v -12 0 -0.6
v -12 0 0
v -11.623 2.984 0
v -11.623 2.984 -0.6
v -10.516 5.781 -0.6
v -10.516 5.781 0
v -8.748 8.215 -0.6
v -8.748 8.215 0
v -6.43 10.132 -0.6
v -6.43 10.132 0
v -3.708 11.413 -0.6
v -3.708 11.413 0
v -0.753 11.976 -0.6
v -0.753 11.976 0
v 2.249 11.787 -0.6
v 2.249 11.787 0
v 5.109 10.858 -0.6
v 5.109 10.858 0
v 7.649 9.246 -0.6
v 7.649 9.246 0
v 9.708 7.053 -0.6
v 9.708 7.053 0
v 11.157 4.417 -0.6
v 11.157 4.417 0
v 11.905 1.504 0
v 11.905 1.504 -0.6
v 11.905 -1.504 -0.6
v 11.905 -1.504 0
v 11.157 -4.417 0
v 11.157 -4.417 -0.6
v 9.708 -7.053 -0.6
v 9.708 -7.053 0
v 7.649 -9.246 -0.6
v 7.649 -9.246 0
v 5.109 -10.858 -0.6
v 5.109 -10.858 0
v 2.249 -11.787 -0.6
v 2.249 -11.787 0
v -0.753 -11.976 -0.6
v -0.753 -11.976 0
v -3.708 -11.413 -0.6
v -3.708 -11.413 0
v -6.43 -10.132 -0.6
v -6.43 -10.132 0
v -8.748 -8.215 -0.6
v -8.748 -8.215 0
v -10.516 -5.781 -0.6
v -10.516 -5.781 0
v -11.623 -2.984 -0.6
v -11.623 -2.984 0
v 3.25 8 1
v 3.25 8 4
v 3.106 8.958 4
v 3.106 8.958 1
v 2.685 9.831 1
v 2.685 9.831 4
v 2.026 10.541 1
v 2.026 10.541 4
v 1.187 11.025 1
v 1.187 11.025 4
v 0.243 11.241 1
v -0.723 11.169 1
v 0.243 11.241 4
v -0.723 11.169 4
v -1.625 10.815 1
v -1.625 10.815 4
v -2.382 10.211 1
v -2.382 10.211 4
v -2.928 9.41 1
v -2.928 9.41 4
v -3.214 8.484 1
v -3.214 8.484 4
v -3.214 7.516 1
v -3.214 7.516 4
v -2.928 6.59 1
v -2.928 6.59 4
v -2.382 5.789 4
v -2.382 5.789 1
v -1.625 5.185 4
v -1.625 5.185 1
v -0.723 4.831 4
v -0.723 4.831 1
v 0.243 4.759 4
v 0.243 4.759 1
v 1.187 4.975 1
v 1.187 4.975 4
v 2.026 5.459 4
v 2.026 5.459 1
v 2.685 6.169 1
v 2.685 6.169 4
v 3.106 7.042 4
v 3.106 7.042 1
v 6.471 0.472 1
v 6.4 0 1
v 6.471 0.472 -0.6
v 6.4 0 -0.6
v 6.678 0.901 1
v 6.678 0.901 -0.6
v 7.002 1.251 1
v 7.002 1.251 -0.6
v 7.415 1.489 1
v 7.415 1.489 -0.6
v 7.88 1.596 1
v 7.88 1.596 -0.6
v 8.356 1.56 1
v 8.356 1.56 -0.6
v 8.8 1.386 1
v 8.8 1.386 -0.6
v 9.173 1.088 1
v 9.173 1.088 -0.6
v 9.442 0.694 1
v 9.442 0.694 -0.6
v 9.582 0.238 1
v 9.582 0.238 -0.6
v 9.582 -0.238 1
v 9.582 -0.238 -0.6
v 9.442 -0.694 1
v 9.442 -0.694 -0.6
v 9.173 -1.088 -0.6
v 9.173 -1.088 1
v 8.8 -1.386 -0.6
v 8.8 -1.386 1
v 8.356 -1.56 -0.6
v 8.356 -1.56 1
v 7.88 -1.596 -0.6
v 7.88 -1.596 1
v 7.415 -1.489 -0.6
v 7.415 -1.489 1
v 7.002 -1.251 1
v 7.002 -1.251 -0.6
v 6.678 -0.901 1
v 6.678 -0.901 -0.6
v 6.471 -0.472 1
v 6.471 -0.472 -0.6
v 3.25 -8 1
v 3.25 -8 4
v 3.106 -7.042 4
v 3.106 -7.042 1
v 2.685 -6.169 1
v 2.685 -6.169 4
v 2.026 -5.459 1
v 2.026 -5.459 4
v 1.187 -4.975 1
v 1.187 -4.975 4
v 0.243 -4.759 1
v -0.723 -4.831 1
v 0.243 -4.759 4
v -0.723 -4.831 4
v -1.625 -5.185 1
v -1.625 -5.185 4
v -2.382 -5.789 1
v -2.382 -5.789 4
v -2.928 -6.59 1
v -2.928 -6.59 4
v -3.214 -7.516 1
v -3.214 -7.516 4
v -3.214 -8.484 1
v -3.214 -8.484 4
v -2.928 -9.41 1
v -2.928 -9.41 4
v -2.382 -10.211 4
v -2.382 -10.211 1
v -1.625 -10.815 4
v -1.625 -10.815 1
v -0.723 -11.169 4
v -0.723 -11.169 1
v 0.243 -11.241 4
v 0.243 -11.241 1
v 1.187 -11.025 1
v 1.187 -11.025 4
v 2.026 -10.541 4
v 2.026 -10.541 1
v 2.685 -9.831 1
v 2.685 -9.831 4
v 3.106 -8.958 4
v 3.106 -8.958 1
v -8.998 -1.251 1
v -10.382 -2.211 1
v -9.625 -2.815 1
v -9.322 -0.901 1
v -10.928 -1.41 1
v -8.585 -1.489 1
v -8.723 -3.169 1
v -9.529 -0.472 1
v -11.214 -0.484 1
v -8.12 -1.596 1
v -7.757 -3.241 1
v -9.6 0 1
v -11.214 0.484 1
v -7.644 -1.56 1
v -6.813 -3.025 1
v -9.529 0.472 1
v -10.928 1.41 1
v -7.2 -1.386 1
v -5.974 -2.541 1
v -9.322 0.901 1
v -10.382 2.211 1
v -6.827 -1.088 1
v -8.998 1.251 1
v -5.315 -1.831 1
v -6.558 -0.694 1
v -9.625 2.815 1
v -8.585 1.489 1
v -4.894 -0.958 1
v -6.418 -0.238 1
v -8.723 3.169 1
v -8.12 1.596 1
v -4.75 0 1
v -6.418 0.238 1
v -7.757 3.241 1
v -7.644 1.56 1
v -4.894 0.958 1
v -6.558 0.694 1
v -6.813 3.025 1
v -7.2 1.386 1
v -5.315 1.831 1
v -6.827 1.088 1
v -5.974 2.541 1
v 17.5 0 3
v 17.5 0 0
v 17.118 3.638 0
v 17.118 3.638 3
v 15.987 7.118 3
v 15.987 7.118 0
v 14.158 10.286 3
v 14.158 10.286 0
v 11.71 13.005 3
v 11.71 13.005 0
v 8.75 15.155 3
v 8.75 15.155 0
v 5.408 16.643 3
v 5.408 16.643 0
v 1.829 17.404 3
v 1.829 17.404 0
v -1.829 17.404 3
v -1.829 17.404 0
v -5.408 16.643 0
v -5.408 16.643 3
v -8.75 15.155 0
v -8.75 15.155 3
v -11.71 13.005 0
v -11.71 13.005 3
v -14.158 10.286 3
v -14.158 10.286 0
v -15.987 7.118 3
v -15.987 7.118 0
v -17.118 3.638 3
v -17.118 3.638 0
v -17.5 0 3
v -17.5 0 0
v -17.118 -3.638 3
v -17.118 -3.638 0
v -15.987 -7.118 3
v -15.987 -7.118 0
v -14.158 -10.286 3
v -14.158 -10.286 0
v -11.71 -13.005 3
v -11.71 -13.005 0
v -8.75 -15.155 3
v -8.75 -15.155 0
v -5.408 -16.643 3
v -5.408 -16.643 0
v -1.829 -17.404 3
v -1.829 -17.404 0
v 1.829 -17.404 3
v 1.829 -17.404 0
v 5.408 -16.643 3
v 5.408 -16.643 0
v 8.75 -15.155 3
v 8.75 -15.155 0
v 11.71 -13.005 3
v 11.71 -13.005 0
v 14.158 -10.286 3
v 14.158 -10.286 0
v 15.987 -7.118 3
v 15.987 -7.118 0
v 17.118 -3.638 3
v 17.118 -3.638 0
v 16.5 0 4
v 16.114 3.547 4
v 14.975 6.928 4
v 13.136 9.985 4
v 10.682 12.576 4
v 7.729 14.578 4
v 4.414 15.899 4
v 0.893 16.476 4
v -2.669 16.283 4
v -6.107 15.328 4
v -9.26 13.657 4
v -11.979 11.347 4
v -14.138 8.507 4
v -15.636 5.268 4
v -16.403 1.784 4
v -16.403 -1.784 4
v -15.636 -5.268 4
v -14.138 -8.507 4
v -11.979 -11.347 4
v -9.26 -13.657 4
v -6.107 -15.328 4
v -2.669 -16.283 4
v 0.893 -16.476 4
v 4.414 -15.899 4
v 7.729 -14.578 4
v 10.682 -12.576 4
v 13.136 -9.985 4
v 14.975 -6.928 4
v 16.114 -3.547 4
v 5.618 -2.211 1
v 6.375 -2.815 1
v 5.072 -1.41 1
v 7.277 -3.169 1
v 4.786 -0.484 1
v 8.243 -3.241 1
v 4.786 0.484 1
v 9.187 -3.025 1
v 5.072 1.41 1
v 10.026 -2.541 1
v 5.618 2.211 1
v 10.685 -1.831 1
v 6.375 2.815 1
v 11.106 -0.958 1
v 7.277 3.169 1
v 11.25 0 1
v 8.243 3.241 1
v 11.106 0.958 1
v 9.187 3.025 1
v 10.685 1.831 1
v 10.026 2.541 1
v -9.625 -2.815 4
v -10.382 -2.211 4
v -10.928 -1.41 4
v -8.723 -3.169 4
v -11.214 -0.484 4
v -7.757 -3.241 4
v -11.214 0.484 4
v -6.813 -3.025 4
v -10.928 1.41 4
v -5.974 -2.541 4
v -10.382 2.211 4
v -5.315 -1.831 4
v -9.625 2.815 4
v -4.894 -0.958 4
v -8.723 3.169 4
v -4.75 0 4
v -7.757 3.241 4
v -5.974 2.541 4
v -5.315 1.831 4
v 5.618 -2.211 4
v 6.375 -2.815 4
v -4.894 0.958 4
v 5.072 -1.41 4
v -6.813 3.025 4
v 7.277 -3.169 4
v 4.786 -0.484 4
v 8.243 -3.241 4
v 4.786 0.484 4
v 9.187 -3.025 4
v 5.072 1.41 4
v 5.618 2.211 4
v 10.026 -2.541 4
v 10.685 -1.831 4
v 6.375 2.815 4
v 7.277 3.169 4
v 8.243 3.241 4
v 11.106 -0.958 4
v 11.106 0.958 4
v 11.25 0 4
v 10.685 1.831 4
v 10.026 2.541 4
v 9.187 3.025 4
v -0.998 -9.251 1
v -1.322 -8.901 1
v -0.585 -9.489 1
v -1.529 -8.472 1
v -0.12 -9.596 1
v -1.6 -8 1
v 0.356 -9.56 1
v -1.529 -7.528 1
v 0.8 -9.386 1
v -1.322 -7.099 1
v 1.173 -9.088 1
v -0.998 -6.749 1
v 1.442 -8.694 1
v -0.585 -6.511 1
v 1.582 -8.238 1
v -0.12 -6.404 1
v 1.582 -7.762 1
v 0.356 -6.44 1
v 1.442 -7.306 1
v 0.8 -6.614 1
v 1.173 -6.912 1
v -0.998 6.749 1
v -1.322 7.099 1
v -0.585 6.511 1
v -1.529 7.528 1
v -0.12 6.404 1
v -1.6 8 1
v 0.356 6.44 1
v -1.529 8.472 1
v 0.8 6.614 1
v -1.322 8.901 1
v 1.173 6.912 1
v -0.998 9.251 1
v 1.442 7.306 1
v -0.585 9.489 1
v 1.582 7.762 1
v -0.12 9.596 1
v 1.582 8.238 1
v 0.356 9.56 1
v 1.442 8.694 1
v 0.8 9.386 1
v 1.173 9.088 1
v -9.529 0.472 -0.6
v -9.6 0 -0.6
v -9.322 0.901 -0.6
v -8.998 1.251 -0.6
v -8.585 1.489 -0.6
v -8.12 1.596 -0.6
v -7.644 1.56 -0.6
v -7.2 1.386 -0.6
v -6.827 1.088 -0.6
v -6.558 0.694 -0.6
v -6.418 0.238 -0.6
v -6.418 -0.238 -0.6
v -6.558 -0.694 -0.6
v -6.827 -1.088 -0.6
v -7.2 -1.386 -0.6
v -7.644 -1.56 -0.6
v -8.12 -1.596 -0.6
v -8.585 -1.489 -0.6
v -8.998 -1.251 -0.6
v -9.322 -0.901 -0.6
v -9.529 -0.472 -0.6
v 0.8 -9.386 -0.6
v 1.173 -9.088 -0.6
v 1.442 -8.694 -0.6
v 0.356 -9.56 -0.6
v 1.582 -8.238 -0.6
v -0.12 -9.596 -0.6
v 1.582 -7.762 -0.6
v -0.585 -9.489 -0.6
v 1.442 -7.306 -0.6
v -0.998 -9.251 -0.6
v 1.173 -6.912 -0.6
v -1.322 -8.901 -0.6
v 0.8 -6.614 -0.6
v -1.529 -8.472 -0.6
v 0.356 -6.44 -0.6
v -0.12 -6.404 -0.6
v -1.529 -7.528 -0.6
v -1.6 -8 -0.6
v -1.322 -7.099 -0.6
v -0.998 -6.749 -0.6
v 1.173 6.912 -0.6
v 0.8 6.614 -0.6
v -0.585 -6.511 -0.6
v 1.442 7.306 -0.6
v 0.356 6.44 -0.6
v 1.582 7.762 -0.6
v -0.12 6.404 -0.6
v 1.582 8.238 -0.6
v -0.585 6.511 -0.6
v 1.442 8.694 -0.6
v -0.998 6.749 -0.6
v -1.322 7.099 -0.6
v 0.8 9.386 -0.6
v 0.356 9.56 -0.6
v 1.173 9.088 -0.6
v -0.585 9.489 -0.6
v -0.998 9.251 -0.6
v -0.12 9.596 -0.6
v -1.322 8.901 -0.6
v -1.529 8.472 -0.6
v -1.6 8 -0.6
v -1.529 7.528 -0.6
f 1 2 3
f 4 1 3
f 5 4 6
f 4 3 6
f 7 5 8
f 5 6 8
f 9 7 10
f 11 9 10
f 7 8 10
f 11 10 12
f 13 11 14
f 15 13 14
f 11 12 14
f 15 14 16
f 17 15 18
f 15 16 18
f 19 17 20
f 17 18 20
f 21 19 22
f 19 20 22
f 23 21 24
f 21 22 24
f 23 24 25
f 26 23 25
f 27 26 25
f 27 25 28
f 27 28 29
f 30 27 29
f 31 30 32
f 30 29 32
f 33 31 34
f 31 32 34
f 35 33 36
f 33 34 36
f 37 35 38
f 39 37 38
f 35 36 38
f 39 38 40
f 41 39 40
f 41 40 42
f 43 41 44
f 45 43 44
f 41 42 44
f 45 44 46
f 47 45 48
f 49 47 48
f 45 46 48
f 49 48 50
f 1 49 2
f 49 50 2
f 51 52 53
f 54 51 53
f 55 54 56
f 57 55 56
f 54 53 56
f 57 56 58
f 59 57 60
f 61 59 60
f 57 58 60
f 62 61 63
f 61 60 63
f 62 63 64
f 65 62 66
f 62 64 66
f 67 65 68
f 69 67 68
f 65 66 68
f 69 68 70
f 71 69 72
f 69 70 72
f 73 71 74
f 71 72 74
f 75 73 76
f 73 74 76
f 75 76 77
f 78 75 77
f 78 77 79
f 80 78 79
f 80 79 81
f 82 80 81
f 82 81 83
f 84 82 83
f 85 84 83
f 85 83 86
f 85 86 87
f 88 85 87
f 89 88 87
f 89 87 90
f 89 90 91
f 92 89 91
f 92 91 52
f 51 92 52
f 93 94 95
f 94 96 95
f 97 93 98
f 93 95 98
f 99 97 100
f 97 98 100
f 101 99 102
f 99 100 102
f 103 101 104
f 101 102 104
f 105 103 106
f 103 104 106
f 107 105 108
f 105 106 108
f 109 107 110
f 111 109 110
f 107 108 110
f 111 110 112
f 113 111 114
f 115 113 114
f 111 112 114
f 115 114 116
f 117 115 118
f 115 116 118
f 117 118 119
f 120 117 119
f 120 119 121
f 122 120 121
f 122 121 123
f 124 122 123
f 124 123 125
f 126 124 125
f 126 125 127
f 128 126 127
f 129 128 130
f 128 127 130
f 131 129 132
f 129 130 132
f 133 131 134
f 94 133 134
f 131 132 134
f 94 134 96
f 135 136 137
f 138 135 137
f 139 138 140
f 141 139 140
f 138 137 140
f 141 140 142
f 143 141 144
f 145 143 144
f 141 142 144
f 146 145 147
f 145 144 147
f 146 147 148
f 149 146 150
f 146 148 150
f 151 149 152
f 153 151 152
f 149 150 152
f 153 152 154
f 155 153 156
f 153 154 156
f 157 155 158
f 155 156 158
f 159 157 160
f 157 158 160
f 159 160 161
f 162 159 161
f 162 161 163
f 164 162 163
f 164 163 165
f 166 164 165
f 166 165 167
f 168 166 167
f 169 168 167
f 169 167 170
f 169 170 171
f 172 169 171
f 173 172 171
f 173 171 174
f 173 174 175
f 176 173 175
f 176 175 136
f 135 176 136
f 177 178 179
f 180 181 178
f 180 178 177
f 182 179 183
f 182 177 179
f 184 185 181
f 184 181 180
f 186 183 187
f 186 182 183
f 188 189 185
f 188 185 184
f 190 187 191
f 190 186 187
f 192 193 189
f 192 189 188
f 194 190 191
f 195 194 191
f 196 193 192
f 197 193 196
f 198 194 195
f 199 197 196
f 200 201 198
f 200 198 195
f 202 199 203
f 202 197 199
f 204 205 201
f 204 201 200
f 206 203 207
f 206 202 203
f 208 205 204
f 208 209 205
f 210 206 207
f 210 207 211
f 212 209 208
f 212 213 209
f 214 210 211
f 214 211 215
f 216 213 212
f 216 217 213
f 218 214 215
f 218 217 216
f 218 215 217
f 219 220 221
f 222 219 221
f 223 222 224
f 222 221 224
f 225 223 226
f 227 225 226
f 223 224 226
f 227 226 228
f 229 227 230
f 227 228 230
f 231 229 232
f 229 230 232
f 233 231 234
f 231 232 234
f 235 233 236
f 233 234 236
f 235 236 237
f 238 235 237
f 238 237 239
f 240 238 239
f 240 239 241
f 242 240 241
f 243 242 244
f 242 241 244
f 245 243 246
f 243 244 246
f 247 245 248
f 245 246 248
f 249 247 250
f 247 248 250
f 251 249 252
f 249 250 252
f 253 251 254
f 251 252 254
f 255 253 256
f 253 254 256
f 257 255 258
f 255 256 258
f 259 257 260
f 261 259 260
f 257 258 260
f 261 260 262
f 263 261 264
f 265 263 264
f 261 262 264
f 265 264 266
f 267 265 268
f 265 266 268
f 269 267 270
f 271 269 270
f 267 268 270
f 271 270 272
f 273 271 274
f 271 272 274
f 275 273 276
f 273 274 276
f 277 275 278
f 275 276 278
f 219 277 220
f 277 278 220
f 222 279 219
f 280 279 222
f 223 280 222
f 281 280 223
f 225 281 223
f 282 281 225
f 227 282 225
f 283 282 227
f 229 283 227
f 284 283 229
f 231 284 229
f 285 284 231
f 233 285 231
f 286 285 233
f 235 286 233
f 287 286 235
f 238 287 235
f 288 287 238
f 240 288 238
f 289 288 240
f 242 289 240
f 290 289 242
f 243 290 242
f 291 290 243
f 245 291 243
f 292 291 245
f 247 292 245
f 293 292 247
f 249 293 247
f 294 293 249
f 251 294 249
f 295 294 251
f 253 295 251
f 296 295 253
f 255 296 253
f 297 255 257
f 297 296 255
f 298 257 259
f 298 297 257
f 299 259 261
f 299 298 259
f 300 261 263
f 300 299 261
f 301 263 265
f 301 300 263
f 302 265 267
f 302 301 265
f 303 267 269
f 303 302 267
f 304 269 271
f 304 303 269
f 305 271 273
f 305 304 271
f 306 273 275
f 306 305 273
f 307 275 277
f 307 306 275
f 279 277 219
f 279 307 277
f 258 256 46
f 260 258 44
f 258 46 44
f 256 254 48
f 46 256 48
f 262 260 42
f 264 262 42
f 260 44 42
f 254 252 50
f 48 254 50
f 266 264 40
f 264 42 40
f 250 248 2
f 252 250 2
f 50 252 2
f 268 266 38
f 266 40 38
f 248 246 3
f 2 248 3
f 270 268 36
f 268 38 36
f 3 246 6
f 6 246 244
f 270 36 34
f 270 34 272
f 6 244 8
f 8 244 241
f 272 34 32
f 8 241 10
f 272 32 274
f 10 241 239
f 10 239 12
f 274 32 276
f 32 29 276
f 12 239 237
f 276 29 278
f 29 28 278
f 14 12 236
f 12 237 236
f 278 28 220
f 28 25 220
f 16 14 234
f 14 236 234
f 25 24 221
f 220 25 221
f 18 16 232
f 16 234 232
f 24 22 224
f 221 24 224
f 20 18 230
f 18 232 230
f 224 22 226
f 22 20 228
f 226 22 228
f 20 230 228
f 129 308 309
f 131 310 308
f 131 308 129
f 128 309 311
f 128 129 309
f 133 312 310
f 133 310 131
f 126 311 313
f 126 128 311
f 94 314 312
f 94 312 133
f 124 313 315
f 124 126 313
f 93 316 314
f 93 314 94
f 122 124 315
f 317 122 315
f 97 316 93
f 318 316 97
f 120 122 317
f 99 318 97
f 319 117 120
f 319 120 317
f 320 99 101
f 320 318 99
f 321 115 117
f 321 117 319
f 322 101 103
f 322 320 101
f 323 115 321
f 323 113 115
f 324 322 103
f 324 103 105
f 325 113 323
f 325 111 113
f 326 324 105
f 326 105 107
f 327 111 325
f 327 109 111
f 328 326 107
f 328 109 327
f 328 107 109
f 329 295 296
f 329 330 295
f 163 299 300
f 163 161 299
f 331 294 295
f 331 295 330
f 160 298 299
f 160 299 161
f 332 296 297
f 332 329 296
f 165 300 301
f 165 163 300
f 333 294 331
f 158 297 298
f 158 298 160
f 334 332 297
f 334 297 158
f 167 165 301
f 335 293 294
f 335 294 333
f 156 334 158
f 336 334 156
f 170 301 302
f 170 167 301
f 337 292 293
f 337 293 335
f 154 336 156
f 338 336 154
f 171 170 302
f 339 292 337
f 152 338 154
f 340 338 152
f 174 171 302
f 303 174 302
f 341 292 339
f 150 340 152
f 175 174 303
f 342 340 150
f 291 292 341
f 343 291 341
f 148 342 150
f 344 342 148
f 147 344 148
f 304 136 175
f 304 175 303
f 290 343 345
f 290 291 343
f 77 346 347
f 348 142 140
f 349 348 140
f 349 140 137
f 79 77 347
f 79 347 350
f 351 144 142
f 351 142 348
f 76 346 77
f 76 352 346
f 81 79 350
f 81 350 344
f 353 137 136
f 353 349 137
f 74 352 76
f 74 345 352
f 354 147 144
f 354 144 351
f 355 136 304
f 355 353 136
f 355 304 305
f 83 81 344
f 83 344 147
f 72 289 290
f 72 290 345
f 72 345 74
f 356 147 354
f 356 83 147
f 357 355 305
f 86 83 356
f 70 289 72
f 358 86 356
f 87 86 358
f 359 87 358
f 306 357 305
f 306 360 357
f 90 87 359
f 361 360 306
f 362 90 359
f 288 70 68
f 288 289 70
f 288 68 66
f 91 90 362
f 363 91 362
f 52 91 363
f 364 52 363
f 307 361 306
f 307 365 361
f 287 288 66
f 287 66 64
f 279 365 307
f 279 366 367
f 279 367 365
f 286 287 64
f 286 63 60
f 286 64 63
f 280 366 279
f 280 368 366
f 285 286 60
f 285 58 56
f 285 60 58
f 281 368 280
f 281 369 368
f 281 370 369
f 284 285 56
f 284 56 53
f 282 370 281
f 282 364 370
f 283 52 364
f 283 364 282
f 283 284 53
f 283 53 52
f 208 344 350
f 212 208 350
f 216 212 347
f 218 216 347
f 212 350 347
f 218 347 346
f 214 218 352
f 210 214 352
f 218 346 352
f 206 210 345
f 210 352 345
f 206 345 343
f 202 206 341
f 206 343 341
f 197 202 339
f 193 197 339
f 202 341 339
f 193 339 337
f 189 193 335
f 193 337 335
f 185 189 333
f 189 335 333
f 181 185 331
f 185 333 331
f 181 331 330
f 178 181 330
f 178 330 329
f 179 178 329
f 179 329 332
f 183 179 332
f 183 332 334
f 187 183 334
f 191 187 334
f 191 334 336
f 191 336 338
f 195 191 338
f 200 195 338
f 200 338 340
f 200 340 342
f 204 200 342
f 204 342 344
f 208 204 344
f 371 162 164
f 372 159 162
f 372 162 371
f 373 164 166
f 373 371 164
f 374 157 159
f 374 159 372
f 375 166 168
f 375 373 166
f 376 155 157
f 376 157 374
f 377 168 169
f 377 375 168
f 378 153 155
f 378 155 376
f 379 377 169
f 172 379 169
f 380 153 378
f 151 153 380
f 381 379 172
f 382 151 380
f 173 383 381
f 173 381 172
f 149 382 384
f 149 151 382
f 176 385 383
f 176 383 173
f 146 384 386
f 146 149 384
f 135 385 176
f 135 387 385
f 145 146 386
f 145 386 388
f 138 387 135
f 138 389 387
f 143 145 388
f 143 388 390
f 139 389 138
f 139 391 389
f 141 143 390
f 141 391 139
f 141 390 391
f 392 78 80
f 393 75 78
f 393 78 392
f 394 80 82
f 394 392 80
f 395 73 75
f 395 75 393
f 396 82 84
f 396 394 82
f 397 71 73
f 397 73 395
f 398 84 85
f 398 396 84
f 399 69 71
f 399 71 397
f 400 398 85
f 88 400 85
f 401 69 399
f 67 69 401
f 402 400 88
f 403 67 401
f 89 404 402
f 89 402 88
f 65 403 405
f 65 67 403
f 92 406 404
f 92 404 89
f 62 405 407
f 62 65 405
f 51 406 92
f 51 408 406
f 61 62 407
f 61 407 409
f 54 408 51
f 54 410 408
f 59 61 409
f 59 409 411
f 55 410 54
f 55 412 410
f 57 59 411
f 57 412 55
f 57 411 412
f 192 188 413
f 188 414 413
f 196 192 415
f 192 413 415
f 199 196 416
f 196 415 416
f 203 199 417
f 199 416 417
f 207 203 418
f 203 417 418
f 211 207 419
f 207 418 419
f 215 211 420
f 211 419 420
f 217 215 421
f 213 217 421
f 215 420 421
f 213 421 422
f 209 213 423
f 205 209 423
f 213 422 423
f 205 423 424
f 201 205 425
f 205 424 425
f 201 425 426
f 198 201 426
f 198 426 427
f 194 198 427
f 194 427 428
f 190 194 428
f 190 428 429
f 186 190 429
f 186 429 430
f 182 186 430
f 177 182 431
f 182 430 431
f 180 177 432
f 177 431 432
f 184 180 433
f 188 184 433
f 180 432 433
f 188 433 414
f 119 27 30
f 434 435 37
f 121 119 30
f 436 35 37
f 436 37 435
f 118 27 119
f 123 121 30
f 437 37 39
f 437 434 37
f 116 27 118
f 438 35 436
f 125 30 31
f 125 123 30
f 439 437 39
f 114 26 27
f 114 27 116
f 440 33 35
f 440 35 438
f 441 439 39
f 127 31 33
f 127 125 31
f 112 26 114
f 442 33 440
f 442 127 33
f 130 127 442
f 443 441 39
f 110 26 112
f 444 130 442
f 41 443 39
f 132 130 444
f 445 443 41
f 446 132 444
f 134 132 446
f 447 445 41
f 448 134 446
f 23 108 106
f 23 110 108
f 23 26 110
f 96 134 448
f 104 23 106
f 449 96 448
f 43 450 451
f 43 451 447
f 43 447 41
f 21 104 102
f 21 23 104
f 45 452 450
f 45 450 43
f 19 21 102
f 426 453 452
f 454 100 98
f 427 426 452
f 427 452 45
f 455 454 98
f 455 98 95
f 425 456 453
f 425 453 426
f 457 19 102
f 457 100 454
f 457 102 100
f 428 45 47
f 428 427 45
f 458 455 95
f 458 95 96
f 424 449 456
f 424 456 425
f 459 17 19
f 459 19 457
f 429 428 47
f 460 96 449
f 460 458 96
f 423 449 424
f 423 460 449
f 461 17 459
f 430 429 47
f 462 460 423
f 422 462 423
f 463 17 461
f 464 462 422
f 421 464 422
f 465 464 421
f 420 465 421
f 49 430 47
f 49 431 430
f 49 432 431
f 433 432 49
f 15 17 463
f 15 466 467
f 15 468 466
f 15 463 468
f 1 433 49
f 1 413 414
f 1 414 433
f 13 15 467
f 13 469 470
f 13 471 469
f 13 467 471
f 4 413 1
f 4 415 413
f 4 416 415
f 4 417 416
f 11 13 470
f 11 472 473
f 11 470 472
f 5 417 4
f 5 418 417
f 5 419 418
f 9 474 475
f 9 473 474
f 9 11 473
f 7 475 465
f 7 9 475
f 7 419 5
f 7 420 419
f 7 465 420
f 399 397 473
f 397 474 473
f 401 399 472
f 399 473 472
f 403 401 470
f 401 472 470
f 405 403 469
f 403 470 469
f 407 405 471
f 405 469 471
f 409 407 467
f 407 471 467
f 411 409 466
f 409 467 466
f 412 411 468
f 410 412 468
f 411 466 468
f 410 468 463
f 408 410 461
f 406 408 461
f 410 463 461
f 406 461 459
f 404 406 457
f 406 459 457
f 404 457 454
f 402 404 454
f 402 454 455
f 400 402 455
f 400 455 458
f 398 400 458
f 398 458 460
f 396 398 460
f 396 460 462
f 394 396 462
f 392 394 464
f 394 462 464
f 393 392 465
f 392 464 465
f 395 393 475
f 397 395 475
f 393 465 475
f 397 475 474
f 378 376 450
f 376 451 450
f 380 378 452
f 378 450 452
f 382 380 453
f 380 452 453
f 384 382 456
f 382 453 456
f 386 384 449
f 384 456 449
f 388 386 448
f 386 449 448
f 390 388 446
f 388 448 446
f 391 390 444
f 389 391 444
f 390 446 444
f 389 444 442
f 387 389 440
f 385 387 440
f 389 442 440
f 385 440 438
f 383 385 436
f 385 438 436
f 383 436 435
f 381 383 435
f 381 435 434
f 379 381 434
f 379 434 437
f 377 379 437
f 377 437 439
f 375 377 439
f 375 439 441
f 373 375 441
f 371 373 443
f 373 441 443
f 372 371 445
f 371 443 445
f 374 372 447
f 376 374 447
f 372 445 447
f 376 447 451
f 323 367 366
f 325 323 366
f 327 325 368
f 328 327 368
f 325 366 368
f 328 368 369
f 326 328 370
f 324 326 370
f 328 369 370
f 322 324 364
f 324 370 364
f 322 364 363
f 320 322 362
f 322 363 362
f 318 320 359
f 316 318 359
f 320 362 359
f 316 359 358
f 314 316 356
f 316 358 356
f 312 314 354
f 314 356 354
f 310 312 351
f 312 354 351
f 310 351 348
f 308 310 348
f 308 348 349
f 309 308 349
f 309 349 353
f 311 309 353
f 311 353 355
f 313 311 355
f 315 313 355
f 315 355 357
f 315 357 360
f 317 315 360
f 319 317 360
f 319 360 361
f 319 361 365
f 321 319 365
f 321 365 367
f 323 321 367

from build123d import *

# Parameters (mm, degrees)
SKETCH1_R                      = 17.5
BOSS_EXTRUDE1_DEPTH            = 4
SKETCH2_R                      = 12
BOSS_EXTRUDE2_DEPTH            = 0.6
CBORE_FOR_M3_SHCS1_D           = 3.2
CBORE_FOR_M3_SHCS1_CBORE_D     = 6.5
CBORE_FOR_M3_SHCS1_CBORE_DEPTH = 3
CHAMFER1_SIZE                  = 1


with BuildPart() as part:
    # Sketch1 → Boss-Extrude1 (new body)
    with BuildSketch(Plane.XY):
        Circle(SKETCH1_R)
    extrude(amount=BOSS_EXTRUDE1_DEPTH)

    # Sketch2 → Boss-Extrude2 (add)
    with BuildSketch(Plane(origin=(0, 0, 0), x_dir=(-1, 0, 0), z_dir=(0, 0, -1))):
        Circle(SKETCH2_R)
    extrude(amount=BOSS_EXTRUDE2_DEPTH)

    # CBORE for M3 SHCS1 (through all)
    with Locations(Plane.XY.offset(4)):
        with Locations((0, 8), (8, 0), (0, -8), (-8, 0)):
            CounterBoreHole(CBORE_FOR_M3_SHCS1_D / 2, CBORE_FOR_M3_SHCS1_CBORE_D / 2, CBORE_FOR_M3_SHCS1_CBORE_DEPTH)

    # Chamfer1
    chamfer1_edges = [part.edges().sort_by_distance(p)[0] for p in [
        (-17.5, 0, 4),
    ]]
    chamfer(chamfer1_edges, length=CHAMFER1_SIZE)


solid = part.part
